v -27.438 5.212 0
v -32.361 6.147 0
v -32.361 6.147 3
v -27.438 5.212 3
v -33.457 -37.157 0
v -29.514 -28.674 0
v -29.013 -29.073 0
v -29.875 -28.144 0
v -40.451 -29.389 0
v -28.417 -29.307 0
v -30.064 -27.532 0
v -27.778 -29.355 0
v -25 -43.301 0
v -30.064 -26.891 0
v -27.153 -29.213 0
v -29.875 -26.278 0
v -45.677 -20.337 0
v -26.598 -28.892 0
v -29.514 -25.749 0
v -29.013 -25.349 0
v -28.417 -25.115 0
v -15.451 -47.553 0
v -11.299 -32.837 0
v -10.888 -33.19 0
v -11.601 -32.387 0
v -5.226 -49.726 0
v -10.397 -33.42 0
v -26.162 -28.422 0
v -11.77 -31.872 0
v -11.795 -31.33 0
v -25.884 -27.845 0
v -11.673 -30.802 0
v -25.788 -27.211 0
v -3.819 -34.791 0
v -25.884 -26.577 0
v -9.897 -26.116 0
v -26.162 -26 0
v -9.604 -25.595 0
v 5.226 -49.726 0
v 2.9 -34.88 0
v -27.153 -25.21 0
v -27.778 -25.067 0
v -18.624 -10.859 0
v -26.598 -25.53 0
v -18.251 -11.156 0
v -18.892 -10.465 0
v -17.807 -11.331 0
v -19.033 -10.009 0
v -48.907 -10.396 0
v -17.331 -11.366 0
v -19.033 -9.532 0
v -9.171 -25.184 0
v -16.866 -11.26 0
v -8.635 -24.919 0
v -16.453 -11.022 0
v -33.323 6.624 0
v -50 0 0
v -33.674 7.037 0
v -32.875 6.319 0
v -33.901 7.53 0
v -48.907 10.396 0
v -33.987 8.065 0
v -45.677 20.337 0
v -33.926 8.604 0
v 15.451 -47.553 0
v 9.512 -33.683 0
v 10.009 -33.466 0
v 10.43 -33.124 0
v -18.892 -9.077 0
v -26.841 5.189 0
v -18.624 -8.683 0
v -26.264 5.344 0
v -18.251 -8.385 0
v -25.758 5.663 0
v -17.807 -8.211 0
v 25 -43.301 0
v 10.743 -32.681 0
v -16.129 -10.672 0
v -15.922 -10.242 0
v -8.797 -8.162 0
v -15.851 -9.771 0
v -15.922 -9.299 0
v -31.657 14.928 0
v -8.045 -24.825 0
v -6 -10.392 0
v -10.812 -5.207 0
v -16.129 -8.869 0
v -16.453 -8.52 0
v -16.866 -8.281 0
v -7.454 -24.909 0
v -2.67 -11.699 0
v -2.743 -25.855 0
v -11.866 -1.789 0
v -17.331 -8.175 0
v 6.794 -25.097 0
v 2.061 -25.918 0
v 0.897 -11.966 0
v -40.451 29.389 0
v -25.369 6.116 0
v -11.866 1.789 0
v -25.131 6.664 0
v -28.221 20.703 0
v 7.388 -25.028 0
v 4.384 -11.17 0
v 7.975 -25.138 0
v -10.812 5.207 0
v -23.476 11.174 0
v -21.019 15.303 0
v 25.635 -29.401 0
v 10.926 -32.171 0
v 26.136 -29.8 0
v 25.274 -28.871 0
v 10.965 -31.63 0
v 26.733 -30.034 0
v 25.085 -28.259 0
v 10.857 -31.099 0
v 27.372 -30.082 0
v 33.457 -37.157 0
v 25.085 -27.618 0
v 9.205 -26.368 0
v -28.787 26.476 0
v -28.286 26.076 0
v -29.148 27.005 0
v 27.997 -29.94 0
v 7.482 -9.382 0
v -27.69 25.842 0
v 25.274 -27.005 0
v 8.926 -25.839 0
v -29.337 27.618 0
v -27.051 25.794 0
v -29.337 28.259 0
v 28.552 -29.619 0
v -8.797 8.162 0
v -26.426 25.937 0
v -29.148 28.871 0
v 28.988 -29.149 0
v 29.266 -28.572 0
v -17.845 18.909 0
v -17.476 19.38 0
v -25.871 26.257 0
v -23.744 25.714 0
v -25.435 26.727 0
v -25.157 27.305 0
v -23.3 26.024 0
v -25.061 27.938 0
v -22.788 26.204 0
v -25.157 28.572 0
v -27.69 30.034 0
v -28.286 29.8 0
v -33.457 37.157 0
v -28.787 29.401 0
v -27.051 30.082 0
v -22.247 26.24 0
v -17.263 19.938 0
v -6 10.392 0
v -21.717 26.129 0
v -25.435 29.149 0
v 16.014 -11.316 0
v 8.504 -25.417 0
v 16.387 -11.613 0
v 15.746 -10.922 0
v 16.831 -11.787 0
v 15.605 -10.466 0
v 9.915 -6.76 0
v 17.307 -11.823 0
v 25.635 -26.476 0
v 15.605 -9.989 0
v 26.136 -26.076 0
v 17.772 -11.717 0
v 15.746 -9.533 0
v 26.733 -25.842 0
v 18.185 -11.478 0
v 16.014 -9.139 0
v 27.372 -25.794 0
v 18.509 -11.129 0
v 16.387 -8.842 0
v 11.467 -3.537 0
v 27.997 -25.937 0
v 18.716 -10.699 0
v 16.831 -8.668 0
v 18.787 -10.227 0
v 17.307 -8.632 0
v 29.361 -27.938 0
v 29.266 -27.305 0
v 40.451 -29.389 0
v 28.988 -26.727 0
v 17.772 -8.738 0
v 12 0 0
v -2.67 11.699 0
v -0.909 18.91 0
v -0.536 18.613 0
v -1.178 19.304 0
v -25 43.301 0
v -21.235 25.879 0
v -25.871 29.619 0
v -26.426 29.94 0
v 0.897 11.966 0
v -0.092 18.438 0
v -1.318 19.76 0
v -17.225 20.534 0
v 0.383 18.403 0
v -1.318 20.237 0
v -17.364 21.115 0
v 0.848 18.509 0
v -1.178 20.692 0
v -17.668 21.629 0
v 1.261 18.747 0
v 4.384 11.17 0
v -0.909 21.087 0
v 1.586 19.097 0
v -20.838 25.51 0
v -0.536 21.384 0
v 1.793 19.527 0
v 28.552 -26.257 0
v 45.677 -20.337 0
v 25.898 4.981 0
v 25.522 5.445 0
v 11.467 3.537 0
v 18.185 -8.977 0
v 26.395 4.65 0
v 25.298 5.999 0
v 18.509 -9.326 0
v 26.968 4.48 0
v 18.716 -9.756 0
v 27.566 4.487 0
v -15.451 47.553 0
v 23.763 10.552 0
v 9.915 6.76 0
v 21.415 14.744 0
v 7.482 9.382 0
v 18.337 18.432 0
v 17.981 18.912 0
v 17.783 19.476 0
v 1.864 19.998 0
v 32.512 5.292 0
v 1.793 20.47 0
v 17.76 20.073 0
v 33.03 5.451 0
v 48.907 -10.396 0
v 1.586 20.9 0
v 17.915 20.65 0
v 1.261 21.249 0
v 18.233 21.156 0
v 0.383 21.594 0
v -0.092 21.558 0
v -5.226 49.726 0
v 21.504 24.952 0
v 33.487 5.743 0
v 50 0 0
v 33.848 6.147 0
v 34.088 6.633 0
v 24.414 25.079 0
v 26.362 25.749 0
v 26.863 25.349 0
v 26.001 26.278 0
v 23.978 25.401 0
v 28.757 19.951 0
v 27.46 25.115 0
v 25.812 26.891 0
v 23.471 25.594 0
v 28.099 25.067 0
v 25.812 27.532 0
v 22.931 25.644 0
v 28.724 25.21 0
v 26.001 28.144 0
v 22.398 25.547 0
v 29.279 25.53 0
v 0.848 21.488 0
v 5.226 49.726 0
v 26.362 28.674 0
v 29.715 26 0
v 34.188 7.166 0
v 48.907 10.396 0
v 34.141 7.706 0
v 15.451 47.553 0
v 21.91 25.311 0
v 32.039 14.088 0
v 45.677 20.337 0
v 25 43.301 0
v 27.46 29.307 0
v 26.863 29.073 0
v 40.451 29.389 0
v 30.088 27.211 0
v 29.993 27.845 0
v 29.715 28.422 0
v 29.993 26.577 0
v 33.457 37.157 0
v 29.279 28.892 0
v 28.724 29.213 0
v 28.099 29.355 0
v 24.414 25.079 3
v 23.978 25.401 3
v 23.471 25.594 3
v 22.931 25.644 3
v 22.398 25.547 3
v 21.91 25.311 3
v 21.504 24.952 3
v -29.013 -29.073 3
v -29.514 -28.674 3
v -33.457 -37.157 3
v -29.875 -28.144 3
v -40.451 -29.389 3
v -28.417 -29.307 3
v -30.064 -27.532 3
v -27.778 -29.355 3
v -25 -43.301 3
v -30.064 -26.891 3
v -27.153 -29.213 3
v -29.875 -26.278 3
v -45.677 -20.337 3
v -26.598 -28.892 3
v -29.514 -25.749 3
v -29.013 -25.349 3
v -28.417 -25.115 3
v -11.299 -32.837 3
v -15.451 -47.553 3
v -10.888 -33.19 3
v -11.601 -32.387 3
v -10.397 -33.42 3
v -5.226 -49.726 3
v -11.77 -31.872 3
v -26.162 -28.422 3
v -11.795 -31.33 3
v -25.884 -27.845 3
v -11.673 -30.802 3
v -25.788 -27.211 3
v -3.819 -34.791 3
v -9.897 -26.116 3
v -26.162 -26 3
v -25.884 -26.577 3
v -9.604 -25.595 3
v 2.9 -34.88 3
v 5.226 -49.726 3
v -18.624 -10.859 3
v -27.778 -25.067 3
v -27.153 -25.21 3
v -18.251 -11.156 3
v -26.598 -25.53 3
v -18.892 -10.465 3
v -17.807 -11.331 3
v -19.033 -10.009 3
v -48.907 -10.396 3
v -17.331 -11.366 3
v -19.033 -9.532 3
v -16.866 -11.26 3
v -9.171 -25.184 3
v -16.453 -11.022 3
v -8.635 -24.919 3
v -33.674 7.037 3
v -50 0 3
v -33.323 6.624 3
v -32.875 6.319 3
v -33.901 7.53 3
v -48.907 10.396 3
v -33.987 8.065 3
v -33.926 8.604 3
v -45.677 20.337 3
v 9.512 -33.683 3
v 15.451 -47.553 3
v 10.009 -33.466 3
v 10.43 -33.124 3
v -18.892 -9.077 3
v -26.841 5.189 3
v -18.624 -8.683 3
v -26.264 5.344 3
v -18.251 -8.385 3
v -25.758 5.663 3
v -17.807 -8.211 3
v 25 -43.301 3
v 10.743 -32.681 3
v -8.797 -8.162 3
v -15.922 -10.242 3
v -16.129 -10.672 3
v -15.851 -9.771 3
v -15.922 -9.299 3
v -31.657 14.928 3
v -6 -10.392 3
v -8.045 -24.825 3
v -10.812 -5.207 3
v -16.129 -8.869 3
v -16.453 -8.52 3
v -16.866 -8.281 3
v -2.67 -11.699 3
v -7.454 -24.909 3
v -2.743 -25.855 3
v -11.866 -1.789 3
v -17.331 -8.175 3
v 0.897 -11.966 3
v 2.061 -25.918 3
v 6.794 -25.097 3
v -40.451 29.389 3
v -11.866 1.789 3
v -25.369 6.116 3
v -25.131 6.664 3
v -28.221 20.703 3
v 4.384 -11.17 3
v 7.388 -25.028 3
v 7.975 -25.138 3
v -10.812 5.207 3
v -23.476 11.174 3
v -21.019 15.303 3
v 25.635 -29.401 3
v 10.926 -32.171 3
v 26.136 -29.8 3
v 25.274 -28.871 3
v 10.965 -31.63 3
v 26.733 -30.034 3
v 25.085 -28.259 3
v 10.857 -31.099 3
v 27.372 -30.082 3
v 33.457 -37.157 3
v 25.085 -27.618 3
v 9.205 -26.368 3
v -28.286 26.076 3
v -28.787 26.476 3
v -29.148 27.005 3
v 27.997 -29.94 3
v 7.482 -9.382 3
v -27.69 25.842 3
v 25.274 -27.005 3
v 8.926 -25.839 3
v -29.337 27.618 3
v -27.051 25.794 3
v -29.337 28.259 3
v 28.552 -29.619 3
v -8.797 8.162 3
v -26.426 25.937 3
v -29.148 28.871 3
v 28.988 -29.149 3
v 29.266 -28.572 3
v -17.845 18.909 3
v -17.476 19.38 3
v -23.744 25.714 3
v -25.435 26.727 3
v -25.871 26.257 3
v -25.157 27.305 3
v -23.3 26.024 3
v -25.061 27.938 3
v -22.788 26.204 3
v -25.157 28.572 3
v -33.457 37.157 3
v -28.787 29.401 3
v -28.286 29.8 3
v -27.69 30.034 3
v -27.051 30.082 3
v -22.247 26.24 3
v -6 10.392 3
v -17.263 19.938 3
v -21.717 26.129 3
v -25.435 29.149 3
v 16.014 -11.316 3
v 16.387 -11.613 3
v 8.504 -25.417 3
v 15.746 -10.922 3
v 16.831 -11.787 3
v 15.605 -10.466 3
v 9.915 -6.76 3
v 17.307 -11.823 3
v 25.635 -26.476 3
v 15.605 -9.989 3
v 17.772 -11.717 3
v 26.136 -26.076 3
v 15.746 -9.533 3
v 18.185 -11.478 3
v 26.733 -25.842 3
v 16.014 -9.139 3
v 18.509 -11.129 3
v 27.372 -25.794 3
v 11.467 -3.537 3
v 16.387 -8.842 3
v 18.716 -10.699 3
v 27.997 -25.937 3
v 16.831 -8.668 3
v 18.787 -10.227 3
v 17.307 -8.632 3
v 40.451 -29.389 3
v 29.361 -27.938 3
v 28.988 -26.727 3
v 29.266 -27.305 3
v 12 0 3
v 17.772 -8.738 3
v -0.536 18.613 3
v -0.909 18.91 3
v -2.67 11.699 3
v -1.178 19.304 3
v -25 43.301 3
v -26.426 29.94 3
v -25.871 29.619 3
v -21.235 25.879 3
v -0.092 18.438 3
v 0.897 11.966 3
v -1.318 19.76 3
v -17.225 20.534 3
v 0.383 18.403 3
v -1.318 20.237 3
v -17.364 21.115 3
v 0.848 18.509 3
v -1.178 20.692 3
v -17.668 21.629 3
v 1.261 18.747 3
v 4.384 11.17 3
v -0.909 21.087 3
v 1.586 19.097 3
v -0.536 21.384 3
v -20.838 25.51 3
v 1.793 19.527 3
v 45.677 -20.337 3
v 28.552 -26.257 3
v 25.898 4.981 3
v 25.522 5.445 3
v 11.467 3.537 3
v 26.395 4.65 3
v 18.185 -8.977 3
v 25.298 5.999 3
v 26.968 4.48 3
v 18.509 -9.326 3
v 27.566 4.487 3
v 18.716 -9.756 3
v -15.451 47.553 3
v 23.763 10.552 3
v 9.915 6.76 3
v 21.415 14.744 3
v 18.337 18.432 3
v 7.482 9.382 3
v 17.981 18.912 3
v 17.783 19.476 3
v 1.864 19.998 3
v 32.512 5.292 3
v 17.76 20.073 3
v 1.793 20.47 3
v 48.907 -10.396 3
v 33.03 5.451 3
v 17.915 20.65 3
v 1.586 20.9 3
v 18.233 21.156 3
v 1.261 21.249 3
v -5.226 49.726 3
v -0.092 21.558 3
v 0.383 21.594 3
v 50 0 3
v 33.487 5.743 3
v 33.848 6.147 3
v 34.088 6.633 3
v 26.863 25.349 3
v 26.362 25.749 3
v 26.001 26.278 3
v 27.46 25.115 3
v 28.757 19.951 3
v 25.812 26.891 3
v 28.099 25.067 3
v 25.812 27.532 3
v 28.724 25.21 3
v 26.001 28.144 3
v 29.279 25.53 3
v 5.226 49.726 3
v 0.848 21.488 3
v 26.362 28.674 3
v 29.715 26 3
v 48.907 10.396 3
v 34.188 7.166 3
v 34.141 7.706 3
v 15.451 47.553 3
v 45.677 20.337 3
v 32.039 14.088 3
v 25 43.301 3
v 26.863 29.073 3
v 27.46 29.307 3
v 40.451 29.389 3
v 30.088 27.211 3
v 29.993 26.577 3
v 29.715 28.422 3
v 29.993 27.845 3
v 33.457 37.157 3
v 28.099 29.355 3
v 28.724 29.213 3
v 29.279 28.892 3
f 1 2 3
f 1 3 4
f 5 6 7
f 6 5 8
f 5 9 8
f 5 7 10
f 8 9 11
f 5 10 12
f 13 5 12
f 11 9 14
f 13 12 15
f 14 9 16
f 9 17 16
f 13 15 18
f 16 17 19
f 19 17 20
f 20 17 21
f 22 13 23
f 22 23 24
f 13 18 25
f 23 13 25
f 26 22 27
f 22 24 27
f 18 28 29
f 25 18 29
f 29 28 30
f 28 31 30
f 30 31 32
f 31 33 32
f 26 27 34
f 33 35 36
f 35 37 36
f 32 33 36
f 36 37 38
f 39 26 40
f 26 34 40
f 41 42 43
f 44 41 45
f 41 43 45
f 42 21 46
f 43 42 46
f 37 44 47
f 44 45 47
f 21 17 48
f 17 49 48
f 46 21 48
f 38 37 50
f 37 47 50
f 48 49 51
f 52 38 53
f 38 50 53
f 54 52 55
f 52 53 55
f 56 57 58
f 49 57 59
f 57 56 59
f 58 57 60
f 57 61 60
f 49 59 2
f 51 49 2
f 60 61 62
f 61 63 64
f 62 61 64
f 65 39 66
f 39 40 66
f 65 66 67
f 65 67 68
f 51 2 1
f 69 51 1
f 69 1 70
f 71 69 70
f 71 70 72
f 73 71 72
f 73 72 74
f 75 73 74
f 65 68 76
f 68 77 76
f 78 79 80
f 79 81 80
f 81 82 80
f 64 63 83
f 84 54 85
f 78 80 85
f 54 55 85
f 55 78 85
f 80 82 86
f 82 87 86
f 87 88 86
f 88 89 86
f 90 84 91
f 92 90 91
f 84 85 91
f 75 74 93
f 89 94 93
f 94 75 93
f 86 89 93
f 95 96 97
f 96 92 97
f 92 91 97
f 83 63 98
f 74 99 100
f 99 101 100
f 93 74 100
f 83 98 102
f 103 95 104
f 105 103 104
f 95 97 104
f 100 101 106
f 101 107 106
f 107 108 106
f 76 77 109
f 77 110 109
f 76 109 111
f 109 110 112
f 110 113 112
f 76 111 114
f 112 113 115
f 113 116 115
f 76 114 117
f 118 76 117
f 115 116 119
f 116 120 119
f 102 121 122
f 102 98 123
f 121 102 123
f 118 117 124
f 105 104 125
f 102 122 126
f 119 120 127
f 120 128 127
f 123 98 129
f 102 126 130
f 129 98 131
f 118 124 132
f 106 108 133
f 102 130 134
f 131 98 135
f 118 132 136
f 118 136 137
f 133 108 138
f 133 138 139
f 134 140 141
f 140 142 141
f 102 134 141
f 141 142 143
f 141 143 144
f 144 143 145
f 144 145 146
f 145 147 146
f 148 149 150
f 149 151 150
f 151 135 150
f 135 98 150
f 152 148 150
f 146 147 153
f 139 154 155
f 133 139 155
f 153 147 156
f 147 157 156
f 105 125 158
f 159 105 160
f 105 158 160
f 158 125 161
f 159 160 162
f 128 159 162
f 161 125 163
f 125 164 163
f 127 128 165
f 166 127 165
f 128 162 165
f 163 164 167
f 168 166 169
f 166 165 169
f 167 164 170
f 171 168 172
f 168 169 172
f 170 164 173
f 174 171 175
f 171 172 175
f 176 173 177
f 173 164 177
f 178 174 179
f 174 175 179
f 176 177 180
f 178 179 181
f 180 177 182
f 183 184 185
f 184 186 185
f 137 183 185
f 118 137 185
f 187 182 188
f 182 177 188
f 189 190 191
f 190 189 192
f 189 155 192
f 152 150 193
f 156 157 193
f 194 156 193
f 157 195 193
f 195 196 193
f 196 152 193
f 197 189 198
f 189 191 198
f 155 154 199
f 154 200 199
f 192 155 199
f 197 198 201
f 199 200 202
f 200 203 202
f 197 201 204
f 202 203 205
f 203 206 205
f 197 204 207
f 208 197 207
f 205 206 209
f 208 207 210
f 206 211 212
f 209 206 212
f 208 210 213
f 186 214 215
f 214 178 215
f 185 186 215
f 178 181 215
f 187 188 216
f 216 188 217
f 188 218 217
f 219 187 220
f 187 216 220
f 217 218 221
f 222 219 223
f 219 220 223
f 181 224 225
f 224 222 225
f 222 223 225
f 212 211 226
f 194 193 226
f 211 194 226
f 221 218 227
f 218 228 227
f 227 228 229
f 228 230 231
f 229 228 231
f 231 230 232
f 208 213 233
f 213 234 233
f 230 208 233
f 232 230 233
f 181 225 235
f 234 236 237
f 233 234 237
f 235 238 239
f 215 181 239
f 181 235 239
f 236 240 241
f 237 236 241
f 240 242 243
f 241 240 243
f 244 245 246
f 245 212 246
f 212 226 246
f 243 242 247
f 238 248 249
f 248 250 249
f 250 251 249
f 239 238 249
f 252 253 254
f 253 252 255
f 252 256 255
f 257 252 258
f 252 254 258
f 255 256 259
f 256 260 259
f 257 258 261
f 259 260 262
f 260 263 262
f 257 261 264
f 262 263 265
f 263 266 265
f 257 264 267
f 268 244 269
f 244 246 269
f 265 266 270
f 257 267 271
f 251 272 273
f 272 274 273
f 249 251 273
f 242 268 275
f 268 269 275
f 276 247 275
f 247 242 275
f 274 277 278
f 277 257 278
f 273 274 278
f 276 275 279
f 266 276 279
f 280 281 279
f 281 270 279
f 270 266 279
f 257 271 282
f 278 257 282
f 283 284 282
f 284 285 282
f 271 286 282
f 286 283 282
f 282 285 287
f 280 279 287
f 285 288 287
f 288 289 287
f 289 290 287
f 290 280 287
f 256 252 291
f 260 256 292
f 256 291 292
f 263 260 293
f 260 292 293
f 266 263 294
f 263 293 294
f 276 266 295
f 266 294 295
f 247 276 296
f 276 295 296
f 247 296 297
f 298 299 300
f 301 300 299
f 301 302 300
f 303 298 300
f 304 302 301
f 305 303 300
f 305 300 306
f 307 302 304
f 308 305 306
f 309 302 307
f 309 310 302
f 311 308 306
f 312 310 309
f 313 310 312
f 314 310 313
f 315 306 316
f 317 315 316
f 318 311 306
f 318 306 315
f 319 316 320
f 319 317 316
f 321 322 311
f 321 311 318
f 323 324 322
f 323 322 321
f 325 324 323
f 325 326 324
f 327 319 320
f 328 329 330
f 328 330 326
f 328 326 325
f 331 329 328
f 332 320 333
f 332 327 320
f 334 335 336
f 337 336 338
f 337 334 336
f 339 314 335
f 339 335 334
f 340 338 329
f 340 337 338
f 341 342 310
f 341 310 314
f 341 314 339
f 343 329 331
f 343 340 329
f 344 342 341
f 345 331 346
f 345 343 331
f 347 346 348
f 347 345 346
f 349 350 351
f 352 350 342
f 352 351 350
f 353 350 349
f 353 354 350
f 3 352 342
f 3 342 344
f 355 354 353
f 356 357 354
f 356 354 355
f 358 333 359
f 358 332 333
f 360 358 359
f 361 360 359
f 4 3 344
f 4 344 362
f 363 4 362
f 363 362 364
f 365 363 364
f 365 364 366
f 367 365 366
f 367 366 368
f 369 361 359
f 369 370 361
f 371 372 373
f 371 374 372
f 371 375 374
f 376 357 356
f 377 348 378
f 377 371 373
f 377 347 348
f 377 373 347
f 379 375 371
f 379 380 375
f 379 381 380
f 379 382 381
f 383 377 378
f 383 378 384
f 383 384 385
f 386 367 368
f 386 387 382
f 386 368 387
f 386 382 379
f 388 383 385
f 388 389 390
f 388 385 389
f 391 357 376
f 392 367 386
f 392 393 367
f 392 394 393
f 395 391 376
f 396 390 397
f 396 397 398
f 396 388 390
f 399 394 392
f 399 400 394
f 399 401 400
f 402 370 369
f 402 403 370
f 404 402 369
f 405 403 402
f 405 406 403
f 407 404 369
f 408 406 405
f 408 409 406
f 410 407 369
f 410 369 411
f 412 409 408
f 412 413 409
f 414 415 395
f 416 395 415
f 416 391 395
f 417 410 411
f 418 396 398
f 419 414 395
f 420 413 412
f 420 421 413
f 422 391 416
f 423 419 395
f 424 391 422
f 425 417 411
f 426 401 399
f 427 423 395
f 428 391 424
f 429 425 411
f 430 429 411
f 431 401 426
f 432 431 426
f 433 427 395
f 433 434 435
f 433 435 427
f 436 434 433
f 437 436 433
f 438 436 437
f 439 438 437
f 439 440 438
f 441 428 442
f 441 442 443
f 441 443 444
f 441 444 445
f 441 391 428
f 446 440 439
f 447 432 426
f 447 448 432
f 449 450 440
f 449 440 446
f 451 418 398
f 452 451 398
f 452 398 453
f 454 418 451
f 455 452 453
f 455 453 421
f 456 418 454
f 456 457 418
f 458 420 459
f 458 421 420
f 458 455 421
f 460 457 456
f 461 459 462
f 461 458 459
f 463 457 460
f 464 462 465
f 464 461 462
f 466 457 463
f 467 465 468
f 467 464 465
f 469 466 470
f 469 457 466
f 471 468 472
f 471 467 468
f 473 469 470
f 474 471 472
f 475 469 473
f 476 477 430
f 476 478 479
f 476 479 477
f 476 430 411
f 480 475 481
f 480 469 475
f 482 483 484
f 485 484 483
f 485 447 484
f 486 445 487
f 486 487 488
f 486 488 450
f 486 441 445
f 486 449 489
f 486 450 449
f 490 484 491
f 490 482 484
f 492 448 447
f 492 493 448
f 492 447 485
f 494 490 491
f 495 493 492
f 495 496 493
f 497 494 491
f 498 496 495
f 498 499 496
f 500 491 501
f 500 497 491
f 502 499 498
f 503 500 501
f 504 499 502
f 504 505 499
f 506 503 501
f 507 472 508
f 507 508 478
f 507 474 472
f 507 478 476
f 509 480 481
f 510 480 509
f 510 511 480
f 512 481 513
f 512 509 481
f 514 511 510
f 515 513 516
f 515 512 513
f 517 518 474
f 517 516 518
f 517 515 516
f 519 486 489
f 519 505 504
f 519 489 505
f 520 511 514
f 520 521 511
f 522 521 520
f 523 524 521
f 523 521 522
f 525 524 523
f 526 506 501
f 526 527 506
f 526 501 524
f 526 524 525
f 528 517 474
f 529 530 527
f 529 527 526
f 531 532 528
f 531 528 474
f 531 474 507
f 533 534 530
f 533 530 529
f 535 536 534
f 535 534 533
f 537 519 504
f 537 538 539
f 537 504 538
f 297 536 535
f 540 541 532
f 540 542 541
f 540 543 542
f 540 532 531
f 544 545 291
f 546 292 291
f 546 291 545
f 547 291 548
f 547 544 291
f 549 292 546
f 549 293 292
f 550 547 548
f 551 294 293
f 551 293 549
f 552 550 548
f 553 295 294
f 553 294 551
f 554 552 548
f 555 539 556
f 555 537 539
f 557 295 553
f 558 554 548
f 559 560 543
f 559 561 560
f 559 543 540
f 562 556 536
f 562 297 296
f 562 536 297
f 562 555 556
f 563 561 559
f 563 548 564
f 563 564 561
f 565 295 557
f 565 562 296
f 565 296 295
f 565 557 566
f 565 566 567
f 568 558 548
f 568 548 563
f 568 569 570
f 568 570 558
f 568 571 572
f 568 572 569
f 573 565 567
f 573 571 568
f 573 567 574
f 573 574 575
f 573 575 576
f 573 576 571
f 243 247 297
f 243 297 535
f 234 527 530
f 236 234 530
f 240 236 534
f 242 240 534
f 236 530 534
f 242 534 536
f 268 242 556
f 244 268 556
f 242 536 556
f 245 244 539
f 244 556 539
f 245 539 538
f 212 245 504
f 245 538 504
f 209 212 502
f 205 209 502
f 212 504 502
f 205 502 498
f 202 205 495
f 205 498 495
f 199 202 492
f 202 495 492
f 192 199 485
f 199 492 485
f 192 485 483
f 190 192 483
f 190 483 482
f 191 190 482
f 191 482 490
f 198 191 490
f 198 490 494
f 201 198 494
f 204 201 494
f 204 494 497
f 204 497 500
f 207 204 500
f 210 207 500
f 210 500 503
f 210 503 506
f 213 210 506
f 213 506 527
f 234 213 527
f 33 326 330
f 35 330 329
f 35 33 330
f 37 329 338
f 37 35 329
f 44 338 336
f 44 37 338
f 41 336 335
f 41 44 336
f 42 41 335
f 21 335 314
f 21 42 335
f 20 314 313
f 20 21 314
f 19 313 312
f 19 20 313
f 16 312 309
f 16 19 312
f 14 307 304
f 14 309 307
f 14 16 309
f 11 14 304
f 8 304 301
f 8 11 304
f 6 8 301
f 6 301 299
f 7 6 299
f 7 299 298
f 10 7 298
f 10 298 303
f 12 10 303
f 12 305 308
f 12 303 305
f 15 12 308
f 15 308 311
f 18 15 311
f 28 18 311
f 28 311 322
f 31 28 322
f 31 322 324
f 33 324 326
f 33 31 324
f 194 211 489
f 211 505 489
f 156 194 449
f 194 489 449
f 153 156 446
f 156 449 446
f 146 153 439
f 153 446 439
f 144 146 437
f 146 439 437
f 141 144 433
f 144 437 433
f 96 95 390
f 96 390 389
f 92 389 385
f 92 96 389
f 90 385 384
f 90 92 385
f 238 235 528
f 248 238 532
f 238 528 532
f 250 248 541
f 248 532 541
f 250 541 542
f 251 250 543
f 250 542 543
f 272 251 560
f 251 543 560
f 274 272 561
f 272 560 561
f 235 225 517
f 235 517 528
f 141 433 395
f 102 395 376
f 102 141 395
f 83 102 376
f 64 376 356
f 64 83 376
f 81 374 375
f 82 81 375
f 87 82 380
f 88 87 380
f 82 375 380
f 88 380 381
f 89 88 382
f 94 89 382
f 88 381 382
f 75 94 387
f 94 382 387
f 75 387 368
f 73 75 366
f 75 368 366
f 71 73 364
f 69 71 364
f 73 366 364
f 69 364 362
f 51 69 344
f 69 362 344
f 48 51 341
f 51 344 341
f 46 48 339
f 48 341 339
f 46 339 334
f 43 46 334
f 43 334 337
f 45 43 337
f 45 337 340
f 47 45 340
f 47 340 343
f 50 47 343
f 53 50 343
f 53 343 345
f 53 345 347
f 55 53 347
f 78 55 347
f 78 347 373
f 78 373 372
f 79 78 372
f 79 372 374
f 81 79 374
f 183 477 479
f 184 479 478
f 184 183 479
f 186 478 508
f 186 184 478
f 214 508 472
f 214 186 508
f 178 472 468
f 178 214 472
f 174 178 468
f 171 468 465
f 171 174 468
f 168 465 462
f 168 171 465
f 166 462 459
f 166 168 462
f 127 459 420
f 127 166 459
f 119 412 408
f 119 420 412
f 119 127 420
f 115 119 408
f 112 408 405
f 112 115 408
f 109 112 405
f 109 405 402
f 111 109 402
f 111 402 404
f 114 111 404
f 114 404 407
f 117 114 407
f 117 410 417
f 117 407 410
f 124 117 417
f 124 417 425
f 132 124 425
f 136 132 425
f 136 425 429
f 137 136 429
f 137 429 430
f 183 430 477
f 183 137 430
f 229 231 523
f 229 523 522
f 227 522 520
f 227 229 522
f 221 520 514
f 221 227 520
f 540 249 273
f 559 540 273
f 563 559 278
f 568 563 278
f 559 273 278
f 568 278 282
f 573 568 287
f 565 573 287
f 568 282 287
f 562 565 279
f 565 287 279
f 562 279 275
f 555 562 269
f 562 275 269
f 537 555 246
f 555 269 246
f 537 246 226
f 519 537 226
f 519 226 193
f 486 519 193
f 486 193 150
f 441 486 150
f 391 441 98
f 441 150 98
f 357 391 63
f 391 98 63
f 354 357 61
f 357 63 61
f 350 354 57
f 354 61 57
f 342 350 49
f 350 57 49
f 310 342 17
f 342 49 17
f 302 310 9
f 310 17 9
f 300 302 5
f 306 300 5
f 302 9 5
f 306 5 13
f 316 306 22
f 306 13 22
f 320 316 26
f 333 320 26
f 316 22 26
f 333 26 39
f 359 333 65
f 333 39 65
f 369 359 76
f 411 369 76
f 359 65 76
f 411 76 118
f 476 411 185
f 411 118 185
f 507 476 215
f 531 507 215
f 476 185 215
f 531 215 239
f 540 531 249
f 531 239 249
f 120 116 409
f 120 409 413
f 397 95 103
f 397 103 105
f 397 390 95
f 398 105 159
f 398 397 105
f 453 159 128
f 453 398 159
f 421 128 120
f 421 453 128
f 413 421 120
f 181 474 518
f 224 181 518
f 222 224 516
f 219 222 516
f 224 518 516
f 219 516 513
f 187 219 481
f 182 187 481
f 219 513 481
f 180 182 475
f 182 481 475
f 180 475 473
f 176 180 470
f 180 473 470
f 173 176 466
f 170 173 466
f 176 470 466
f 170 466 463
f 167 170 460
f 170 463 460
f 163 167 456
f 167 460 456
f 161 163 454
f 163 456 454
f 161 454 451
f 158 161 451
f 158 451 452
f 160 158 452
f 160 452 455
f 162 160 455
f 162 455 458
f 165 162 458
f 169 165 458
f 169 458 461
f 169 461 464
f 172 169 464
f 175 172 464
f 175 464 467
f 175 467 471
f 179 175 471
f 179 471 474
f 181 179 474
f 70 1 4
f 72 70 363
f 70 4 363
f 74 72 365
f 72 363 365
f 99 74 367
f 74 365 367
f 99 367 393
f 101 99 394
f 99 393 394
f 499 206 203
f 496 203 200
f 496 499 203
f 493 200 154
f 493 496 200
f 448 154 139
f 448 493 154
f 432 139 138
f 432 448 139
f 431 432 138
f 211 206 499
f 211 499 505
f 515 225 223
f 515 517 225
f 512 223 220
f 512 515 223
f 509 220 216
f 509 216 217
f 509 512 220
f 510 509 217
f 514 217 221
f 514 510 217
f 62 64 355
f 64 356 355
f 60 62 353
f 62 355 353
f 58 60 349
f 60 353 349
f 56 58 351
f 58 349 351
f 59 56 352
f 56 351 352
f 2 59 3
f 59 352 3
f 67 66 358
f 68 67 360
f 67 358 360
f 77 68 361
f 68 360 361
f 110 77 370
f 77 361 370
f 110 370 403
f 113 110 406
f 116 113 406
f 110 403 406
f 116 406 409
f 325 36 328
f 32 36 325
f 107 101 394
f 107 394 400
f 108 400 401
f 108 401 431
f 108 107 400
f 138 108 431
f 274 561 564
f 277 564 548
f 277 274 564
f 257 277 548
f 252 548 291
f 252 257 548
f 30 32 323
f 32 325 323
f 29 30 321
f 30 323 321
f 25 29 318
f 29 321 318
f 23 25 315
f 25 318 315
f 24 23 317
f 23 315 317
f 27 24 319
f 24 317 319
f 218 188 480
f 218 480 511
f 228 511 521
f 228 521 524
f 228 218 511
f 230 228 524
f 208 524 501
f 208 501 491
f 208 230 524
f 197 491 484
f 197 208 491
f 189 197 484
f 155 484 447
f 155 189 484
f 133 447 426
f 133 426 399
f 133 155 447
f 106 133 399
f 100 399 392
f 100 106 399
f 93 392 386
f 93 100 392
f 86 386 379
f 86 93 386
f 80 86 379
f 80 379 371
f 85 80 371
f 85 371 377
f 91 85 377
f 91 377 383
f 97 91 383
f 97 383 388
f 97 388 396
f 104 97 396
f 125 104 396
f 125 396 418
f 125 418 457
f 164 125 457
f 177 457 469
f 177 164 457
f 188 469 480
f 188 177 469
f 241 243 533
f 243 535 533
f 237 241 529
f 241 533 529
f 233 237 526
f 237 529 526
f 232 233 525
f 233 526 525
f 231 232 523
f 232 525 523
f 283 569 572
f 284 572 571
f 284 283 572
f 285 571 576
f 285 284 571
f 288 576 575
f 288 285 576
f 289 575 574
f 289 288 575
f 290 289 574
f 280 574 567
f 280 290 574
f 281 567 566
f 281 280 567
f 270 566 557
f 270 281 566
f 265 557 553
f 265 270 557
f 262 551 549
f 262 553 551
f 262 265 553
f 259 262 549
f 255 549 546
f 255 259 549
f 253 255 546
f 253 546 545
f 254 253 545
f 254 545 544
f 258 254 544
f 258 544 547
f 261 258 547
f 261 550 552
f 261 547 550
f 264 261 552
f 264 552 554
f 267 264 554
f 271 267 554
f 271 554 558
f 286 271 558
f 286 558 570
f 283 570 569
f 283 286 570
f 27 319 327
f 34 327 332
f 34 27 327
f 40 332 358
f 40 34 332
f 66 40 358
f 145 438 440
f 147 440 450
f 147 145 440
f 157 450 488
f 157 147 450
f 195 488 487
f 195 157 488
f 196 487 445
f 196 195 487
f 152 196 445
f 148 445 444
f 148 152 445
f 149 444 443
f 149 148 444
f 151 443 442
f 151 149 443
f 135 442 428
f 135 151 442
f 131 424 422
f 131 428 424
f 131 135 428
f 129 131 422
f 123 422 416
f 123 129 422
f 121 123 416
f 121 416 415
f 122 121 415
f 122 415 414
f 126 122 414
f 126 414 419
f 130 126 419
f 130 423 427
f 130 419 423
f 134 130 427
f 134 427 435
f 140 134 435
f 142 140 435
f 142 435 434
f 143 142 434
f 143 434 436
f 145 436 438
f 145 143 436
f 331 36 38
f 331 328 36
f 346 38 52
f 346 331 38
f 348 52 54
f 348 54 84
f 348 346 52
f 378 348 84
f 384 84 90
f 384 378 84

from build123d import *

# Parameters (mm, degrees)
SKETCH_1_R                       = 50
SKETCH_1_R_2                     = 12
EXTRUDE_1_DEPTH                  = 3
SKETCH_2_R                       = 1.6
CUT_EXTRUDE_1_DEPTH              = 71.774289117
CUT_EXTRUDE_3_DEPTH              = 71.774289117
FILLET_1_R                       = 2
PATTERN_CIRCULAR_2_COUNT         = 3
FILLET_1_OF_PATTERN_CIRCULAR_2_R = 2
SKETCH_5_R                       = 2.15
CUT_EXTRUDE_4_DEPTH              = 10


with BuildPart() as part:
    # 草图1 → 凸台-拉伸1 (new body)
    with BuildSketch(Plane.XY):
        Circle(SKETCH_1_R)
        Circle(SKETCH_1_R_2, mode=Mode.SUBTRACT)
    extrude(amount=EXTRUDE_1_DEPTH)

    # 草图2 → 切除-拉伸1 (cut, through all)
    with BuildSketch(Plane.XY.offset(3)):
        with Locations((0.263678953, 19.99826176)):
            Circle(SKETCH_2_R)
        with Locations((17.187163239, -10.227483551)):
            Circle(SKETCH_2_R)
        with Locations((-17.450842192, -9.770778208)):
            Circle(SKETCH_2_R)
    extrude(amount=-CUT_EXTRUDE_1_DEPTH, mode=Mode.SUBTRACT)

    # 草图4 → 切除-拉伸3 (cut, through all)
    with BuildSketch(Plane(origin=(0, 0, 0), x_dir=(-1, 0, 0), z_dir=(0, 0, -1))):
        with BuildLine():
            Line((16.448438601, 20.135760914), (22.142128886, 27.105831999))
            ThreePointArc((22.142128886, 27.105831999), (30.077535668, 17.898096215), (34.385147752, 6.531585879))
            Line((34.385147752, 6.531585879), (25.543252616, 4.852035224))
            ThreePointArc((25.543252616, 4.852035224), (22.343312211, 13.295728617), (16.448438601, 20.135760914))
        make_face()
    cut_extrude_3 = extrude(amount=-CUT_EXTRUDE_3_DEPTH, mode=Mode.SUBTRACT)

    # 圆角1
    fillet_1_edges = [part.edges().sort_by_distance(p)[0] for p in [
        (-25.543252616, 4.852035224, 1.5),
        (-16.448438601, 20.135760914, 1.5),
        (-22.142128886, 27.105831999, 1.5),
        (-34.385147752, 6.531585879, 1.5),
    ]]
    fillet(fillet_1_edges, radius=FILLET_1_R)

    # 阵列(圆周)2: 切除-拉伸3 ×3 about axis
    pattern_circular_2_axis = Axis((0, 0, 0), (0, 0, 1))
    for i in range(1, PATTERN_CIRCULAR_2_COUNT):
        add(cut_extrude_3.rotate(pattern_circular_2_axis, i * 360 / PATTERN_CIRCULAR_2_COUNT), mode=Mode.SUBTRACT)

    # 圆角1 of 阵列(圆周)2
    fillet_1_of_pattern_circular_2_edges = [part.edges().sort_by_distance(p)[0] for p in [
        (8.569640543, -24.547123273, 1.5),
        (-9.213861175, -24.312646138, 1.5),
        (-12.403274659, -32.728562109, 1.5),
        (11.536054578, -33.044204405, 1.5),
        (16.973612072, 19.695088048, 1.5),
        (25.662299777, 4.176885224, 1.5),
        (34.545403545, 5.62273011, 1.5),
        (22.849093174, 26.512618526, 1.5),
    ]]
    fillet(fillet_1_of_pattern_circular_2_edges, radius=FILLET_1_OF_PATTERN_CIRCULAR_2_R)

    # 草图5 → 切除-拉伸4 (cut)
    with BuildSketch(Plane.XY):
        with Locations((27.938343572, 27.211191787)):
            Circle(SKETCH_5_R)
        with Locations((27.211191787, -27.938343572)):
            Circle(SKETCH_5_R)
        with Locations((-27.938343572, -27.211191787)):
            Circle(SKETCH_5_R)
        with Locations((-27.211191787, 27.938343572)):
            Circle(SKETCH_5_R)
    extrude(amount=CUT_EXTRUDE_4_DEPTH, mode=Mode.SUBTRACT)


solid = part.part
